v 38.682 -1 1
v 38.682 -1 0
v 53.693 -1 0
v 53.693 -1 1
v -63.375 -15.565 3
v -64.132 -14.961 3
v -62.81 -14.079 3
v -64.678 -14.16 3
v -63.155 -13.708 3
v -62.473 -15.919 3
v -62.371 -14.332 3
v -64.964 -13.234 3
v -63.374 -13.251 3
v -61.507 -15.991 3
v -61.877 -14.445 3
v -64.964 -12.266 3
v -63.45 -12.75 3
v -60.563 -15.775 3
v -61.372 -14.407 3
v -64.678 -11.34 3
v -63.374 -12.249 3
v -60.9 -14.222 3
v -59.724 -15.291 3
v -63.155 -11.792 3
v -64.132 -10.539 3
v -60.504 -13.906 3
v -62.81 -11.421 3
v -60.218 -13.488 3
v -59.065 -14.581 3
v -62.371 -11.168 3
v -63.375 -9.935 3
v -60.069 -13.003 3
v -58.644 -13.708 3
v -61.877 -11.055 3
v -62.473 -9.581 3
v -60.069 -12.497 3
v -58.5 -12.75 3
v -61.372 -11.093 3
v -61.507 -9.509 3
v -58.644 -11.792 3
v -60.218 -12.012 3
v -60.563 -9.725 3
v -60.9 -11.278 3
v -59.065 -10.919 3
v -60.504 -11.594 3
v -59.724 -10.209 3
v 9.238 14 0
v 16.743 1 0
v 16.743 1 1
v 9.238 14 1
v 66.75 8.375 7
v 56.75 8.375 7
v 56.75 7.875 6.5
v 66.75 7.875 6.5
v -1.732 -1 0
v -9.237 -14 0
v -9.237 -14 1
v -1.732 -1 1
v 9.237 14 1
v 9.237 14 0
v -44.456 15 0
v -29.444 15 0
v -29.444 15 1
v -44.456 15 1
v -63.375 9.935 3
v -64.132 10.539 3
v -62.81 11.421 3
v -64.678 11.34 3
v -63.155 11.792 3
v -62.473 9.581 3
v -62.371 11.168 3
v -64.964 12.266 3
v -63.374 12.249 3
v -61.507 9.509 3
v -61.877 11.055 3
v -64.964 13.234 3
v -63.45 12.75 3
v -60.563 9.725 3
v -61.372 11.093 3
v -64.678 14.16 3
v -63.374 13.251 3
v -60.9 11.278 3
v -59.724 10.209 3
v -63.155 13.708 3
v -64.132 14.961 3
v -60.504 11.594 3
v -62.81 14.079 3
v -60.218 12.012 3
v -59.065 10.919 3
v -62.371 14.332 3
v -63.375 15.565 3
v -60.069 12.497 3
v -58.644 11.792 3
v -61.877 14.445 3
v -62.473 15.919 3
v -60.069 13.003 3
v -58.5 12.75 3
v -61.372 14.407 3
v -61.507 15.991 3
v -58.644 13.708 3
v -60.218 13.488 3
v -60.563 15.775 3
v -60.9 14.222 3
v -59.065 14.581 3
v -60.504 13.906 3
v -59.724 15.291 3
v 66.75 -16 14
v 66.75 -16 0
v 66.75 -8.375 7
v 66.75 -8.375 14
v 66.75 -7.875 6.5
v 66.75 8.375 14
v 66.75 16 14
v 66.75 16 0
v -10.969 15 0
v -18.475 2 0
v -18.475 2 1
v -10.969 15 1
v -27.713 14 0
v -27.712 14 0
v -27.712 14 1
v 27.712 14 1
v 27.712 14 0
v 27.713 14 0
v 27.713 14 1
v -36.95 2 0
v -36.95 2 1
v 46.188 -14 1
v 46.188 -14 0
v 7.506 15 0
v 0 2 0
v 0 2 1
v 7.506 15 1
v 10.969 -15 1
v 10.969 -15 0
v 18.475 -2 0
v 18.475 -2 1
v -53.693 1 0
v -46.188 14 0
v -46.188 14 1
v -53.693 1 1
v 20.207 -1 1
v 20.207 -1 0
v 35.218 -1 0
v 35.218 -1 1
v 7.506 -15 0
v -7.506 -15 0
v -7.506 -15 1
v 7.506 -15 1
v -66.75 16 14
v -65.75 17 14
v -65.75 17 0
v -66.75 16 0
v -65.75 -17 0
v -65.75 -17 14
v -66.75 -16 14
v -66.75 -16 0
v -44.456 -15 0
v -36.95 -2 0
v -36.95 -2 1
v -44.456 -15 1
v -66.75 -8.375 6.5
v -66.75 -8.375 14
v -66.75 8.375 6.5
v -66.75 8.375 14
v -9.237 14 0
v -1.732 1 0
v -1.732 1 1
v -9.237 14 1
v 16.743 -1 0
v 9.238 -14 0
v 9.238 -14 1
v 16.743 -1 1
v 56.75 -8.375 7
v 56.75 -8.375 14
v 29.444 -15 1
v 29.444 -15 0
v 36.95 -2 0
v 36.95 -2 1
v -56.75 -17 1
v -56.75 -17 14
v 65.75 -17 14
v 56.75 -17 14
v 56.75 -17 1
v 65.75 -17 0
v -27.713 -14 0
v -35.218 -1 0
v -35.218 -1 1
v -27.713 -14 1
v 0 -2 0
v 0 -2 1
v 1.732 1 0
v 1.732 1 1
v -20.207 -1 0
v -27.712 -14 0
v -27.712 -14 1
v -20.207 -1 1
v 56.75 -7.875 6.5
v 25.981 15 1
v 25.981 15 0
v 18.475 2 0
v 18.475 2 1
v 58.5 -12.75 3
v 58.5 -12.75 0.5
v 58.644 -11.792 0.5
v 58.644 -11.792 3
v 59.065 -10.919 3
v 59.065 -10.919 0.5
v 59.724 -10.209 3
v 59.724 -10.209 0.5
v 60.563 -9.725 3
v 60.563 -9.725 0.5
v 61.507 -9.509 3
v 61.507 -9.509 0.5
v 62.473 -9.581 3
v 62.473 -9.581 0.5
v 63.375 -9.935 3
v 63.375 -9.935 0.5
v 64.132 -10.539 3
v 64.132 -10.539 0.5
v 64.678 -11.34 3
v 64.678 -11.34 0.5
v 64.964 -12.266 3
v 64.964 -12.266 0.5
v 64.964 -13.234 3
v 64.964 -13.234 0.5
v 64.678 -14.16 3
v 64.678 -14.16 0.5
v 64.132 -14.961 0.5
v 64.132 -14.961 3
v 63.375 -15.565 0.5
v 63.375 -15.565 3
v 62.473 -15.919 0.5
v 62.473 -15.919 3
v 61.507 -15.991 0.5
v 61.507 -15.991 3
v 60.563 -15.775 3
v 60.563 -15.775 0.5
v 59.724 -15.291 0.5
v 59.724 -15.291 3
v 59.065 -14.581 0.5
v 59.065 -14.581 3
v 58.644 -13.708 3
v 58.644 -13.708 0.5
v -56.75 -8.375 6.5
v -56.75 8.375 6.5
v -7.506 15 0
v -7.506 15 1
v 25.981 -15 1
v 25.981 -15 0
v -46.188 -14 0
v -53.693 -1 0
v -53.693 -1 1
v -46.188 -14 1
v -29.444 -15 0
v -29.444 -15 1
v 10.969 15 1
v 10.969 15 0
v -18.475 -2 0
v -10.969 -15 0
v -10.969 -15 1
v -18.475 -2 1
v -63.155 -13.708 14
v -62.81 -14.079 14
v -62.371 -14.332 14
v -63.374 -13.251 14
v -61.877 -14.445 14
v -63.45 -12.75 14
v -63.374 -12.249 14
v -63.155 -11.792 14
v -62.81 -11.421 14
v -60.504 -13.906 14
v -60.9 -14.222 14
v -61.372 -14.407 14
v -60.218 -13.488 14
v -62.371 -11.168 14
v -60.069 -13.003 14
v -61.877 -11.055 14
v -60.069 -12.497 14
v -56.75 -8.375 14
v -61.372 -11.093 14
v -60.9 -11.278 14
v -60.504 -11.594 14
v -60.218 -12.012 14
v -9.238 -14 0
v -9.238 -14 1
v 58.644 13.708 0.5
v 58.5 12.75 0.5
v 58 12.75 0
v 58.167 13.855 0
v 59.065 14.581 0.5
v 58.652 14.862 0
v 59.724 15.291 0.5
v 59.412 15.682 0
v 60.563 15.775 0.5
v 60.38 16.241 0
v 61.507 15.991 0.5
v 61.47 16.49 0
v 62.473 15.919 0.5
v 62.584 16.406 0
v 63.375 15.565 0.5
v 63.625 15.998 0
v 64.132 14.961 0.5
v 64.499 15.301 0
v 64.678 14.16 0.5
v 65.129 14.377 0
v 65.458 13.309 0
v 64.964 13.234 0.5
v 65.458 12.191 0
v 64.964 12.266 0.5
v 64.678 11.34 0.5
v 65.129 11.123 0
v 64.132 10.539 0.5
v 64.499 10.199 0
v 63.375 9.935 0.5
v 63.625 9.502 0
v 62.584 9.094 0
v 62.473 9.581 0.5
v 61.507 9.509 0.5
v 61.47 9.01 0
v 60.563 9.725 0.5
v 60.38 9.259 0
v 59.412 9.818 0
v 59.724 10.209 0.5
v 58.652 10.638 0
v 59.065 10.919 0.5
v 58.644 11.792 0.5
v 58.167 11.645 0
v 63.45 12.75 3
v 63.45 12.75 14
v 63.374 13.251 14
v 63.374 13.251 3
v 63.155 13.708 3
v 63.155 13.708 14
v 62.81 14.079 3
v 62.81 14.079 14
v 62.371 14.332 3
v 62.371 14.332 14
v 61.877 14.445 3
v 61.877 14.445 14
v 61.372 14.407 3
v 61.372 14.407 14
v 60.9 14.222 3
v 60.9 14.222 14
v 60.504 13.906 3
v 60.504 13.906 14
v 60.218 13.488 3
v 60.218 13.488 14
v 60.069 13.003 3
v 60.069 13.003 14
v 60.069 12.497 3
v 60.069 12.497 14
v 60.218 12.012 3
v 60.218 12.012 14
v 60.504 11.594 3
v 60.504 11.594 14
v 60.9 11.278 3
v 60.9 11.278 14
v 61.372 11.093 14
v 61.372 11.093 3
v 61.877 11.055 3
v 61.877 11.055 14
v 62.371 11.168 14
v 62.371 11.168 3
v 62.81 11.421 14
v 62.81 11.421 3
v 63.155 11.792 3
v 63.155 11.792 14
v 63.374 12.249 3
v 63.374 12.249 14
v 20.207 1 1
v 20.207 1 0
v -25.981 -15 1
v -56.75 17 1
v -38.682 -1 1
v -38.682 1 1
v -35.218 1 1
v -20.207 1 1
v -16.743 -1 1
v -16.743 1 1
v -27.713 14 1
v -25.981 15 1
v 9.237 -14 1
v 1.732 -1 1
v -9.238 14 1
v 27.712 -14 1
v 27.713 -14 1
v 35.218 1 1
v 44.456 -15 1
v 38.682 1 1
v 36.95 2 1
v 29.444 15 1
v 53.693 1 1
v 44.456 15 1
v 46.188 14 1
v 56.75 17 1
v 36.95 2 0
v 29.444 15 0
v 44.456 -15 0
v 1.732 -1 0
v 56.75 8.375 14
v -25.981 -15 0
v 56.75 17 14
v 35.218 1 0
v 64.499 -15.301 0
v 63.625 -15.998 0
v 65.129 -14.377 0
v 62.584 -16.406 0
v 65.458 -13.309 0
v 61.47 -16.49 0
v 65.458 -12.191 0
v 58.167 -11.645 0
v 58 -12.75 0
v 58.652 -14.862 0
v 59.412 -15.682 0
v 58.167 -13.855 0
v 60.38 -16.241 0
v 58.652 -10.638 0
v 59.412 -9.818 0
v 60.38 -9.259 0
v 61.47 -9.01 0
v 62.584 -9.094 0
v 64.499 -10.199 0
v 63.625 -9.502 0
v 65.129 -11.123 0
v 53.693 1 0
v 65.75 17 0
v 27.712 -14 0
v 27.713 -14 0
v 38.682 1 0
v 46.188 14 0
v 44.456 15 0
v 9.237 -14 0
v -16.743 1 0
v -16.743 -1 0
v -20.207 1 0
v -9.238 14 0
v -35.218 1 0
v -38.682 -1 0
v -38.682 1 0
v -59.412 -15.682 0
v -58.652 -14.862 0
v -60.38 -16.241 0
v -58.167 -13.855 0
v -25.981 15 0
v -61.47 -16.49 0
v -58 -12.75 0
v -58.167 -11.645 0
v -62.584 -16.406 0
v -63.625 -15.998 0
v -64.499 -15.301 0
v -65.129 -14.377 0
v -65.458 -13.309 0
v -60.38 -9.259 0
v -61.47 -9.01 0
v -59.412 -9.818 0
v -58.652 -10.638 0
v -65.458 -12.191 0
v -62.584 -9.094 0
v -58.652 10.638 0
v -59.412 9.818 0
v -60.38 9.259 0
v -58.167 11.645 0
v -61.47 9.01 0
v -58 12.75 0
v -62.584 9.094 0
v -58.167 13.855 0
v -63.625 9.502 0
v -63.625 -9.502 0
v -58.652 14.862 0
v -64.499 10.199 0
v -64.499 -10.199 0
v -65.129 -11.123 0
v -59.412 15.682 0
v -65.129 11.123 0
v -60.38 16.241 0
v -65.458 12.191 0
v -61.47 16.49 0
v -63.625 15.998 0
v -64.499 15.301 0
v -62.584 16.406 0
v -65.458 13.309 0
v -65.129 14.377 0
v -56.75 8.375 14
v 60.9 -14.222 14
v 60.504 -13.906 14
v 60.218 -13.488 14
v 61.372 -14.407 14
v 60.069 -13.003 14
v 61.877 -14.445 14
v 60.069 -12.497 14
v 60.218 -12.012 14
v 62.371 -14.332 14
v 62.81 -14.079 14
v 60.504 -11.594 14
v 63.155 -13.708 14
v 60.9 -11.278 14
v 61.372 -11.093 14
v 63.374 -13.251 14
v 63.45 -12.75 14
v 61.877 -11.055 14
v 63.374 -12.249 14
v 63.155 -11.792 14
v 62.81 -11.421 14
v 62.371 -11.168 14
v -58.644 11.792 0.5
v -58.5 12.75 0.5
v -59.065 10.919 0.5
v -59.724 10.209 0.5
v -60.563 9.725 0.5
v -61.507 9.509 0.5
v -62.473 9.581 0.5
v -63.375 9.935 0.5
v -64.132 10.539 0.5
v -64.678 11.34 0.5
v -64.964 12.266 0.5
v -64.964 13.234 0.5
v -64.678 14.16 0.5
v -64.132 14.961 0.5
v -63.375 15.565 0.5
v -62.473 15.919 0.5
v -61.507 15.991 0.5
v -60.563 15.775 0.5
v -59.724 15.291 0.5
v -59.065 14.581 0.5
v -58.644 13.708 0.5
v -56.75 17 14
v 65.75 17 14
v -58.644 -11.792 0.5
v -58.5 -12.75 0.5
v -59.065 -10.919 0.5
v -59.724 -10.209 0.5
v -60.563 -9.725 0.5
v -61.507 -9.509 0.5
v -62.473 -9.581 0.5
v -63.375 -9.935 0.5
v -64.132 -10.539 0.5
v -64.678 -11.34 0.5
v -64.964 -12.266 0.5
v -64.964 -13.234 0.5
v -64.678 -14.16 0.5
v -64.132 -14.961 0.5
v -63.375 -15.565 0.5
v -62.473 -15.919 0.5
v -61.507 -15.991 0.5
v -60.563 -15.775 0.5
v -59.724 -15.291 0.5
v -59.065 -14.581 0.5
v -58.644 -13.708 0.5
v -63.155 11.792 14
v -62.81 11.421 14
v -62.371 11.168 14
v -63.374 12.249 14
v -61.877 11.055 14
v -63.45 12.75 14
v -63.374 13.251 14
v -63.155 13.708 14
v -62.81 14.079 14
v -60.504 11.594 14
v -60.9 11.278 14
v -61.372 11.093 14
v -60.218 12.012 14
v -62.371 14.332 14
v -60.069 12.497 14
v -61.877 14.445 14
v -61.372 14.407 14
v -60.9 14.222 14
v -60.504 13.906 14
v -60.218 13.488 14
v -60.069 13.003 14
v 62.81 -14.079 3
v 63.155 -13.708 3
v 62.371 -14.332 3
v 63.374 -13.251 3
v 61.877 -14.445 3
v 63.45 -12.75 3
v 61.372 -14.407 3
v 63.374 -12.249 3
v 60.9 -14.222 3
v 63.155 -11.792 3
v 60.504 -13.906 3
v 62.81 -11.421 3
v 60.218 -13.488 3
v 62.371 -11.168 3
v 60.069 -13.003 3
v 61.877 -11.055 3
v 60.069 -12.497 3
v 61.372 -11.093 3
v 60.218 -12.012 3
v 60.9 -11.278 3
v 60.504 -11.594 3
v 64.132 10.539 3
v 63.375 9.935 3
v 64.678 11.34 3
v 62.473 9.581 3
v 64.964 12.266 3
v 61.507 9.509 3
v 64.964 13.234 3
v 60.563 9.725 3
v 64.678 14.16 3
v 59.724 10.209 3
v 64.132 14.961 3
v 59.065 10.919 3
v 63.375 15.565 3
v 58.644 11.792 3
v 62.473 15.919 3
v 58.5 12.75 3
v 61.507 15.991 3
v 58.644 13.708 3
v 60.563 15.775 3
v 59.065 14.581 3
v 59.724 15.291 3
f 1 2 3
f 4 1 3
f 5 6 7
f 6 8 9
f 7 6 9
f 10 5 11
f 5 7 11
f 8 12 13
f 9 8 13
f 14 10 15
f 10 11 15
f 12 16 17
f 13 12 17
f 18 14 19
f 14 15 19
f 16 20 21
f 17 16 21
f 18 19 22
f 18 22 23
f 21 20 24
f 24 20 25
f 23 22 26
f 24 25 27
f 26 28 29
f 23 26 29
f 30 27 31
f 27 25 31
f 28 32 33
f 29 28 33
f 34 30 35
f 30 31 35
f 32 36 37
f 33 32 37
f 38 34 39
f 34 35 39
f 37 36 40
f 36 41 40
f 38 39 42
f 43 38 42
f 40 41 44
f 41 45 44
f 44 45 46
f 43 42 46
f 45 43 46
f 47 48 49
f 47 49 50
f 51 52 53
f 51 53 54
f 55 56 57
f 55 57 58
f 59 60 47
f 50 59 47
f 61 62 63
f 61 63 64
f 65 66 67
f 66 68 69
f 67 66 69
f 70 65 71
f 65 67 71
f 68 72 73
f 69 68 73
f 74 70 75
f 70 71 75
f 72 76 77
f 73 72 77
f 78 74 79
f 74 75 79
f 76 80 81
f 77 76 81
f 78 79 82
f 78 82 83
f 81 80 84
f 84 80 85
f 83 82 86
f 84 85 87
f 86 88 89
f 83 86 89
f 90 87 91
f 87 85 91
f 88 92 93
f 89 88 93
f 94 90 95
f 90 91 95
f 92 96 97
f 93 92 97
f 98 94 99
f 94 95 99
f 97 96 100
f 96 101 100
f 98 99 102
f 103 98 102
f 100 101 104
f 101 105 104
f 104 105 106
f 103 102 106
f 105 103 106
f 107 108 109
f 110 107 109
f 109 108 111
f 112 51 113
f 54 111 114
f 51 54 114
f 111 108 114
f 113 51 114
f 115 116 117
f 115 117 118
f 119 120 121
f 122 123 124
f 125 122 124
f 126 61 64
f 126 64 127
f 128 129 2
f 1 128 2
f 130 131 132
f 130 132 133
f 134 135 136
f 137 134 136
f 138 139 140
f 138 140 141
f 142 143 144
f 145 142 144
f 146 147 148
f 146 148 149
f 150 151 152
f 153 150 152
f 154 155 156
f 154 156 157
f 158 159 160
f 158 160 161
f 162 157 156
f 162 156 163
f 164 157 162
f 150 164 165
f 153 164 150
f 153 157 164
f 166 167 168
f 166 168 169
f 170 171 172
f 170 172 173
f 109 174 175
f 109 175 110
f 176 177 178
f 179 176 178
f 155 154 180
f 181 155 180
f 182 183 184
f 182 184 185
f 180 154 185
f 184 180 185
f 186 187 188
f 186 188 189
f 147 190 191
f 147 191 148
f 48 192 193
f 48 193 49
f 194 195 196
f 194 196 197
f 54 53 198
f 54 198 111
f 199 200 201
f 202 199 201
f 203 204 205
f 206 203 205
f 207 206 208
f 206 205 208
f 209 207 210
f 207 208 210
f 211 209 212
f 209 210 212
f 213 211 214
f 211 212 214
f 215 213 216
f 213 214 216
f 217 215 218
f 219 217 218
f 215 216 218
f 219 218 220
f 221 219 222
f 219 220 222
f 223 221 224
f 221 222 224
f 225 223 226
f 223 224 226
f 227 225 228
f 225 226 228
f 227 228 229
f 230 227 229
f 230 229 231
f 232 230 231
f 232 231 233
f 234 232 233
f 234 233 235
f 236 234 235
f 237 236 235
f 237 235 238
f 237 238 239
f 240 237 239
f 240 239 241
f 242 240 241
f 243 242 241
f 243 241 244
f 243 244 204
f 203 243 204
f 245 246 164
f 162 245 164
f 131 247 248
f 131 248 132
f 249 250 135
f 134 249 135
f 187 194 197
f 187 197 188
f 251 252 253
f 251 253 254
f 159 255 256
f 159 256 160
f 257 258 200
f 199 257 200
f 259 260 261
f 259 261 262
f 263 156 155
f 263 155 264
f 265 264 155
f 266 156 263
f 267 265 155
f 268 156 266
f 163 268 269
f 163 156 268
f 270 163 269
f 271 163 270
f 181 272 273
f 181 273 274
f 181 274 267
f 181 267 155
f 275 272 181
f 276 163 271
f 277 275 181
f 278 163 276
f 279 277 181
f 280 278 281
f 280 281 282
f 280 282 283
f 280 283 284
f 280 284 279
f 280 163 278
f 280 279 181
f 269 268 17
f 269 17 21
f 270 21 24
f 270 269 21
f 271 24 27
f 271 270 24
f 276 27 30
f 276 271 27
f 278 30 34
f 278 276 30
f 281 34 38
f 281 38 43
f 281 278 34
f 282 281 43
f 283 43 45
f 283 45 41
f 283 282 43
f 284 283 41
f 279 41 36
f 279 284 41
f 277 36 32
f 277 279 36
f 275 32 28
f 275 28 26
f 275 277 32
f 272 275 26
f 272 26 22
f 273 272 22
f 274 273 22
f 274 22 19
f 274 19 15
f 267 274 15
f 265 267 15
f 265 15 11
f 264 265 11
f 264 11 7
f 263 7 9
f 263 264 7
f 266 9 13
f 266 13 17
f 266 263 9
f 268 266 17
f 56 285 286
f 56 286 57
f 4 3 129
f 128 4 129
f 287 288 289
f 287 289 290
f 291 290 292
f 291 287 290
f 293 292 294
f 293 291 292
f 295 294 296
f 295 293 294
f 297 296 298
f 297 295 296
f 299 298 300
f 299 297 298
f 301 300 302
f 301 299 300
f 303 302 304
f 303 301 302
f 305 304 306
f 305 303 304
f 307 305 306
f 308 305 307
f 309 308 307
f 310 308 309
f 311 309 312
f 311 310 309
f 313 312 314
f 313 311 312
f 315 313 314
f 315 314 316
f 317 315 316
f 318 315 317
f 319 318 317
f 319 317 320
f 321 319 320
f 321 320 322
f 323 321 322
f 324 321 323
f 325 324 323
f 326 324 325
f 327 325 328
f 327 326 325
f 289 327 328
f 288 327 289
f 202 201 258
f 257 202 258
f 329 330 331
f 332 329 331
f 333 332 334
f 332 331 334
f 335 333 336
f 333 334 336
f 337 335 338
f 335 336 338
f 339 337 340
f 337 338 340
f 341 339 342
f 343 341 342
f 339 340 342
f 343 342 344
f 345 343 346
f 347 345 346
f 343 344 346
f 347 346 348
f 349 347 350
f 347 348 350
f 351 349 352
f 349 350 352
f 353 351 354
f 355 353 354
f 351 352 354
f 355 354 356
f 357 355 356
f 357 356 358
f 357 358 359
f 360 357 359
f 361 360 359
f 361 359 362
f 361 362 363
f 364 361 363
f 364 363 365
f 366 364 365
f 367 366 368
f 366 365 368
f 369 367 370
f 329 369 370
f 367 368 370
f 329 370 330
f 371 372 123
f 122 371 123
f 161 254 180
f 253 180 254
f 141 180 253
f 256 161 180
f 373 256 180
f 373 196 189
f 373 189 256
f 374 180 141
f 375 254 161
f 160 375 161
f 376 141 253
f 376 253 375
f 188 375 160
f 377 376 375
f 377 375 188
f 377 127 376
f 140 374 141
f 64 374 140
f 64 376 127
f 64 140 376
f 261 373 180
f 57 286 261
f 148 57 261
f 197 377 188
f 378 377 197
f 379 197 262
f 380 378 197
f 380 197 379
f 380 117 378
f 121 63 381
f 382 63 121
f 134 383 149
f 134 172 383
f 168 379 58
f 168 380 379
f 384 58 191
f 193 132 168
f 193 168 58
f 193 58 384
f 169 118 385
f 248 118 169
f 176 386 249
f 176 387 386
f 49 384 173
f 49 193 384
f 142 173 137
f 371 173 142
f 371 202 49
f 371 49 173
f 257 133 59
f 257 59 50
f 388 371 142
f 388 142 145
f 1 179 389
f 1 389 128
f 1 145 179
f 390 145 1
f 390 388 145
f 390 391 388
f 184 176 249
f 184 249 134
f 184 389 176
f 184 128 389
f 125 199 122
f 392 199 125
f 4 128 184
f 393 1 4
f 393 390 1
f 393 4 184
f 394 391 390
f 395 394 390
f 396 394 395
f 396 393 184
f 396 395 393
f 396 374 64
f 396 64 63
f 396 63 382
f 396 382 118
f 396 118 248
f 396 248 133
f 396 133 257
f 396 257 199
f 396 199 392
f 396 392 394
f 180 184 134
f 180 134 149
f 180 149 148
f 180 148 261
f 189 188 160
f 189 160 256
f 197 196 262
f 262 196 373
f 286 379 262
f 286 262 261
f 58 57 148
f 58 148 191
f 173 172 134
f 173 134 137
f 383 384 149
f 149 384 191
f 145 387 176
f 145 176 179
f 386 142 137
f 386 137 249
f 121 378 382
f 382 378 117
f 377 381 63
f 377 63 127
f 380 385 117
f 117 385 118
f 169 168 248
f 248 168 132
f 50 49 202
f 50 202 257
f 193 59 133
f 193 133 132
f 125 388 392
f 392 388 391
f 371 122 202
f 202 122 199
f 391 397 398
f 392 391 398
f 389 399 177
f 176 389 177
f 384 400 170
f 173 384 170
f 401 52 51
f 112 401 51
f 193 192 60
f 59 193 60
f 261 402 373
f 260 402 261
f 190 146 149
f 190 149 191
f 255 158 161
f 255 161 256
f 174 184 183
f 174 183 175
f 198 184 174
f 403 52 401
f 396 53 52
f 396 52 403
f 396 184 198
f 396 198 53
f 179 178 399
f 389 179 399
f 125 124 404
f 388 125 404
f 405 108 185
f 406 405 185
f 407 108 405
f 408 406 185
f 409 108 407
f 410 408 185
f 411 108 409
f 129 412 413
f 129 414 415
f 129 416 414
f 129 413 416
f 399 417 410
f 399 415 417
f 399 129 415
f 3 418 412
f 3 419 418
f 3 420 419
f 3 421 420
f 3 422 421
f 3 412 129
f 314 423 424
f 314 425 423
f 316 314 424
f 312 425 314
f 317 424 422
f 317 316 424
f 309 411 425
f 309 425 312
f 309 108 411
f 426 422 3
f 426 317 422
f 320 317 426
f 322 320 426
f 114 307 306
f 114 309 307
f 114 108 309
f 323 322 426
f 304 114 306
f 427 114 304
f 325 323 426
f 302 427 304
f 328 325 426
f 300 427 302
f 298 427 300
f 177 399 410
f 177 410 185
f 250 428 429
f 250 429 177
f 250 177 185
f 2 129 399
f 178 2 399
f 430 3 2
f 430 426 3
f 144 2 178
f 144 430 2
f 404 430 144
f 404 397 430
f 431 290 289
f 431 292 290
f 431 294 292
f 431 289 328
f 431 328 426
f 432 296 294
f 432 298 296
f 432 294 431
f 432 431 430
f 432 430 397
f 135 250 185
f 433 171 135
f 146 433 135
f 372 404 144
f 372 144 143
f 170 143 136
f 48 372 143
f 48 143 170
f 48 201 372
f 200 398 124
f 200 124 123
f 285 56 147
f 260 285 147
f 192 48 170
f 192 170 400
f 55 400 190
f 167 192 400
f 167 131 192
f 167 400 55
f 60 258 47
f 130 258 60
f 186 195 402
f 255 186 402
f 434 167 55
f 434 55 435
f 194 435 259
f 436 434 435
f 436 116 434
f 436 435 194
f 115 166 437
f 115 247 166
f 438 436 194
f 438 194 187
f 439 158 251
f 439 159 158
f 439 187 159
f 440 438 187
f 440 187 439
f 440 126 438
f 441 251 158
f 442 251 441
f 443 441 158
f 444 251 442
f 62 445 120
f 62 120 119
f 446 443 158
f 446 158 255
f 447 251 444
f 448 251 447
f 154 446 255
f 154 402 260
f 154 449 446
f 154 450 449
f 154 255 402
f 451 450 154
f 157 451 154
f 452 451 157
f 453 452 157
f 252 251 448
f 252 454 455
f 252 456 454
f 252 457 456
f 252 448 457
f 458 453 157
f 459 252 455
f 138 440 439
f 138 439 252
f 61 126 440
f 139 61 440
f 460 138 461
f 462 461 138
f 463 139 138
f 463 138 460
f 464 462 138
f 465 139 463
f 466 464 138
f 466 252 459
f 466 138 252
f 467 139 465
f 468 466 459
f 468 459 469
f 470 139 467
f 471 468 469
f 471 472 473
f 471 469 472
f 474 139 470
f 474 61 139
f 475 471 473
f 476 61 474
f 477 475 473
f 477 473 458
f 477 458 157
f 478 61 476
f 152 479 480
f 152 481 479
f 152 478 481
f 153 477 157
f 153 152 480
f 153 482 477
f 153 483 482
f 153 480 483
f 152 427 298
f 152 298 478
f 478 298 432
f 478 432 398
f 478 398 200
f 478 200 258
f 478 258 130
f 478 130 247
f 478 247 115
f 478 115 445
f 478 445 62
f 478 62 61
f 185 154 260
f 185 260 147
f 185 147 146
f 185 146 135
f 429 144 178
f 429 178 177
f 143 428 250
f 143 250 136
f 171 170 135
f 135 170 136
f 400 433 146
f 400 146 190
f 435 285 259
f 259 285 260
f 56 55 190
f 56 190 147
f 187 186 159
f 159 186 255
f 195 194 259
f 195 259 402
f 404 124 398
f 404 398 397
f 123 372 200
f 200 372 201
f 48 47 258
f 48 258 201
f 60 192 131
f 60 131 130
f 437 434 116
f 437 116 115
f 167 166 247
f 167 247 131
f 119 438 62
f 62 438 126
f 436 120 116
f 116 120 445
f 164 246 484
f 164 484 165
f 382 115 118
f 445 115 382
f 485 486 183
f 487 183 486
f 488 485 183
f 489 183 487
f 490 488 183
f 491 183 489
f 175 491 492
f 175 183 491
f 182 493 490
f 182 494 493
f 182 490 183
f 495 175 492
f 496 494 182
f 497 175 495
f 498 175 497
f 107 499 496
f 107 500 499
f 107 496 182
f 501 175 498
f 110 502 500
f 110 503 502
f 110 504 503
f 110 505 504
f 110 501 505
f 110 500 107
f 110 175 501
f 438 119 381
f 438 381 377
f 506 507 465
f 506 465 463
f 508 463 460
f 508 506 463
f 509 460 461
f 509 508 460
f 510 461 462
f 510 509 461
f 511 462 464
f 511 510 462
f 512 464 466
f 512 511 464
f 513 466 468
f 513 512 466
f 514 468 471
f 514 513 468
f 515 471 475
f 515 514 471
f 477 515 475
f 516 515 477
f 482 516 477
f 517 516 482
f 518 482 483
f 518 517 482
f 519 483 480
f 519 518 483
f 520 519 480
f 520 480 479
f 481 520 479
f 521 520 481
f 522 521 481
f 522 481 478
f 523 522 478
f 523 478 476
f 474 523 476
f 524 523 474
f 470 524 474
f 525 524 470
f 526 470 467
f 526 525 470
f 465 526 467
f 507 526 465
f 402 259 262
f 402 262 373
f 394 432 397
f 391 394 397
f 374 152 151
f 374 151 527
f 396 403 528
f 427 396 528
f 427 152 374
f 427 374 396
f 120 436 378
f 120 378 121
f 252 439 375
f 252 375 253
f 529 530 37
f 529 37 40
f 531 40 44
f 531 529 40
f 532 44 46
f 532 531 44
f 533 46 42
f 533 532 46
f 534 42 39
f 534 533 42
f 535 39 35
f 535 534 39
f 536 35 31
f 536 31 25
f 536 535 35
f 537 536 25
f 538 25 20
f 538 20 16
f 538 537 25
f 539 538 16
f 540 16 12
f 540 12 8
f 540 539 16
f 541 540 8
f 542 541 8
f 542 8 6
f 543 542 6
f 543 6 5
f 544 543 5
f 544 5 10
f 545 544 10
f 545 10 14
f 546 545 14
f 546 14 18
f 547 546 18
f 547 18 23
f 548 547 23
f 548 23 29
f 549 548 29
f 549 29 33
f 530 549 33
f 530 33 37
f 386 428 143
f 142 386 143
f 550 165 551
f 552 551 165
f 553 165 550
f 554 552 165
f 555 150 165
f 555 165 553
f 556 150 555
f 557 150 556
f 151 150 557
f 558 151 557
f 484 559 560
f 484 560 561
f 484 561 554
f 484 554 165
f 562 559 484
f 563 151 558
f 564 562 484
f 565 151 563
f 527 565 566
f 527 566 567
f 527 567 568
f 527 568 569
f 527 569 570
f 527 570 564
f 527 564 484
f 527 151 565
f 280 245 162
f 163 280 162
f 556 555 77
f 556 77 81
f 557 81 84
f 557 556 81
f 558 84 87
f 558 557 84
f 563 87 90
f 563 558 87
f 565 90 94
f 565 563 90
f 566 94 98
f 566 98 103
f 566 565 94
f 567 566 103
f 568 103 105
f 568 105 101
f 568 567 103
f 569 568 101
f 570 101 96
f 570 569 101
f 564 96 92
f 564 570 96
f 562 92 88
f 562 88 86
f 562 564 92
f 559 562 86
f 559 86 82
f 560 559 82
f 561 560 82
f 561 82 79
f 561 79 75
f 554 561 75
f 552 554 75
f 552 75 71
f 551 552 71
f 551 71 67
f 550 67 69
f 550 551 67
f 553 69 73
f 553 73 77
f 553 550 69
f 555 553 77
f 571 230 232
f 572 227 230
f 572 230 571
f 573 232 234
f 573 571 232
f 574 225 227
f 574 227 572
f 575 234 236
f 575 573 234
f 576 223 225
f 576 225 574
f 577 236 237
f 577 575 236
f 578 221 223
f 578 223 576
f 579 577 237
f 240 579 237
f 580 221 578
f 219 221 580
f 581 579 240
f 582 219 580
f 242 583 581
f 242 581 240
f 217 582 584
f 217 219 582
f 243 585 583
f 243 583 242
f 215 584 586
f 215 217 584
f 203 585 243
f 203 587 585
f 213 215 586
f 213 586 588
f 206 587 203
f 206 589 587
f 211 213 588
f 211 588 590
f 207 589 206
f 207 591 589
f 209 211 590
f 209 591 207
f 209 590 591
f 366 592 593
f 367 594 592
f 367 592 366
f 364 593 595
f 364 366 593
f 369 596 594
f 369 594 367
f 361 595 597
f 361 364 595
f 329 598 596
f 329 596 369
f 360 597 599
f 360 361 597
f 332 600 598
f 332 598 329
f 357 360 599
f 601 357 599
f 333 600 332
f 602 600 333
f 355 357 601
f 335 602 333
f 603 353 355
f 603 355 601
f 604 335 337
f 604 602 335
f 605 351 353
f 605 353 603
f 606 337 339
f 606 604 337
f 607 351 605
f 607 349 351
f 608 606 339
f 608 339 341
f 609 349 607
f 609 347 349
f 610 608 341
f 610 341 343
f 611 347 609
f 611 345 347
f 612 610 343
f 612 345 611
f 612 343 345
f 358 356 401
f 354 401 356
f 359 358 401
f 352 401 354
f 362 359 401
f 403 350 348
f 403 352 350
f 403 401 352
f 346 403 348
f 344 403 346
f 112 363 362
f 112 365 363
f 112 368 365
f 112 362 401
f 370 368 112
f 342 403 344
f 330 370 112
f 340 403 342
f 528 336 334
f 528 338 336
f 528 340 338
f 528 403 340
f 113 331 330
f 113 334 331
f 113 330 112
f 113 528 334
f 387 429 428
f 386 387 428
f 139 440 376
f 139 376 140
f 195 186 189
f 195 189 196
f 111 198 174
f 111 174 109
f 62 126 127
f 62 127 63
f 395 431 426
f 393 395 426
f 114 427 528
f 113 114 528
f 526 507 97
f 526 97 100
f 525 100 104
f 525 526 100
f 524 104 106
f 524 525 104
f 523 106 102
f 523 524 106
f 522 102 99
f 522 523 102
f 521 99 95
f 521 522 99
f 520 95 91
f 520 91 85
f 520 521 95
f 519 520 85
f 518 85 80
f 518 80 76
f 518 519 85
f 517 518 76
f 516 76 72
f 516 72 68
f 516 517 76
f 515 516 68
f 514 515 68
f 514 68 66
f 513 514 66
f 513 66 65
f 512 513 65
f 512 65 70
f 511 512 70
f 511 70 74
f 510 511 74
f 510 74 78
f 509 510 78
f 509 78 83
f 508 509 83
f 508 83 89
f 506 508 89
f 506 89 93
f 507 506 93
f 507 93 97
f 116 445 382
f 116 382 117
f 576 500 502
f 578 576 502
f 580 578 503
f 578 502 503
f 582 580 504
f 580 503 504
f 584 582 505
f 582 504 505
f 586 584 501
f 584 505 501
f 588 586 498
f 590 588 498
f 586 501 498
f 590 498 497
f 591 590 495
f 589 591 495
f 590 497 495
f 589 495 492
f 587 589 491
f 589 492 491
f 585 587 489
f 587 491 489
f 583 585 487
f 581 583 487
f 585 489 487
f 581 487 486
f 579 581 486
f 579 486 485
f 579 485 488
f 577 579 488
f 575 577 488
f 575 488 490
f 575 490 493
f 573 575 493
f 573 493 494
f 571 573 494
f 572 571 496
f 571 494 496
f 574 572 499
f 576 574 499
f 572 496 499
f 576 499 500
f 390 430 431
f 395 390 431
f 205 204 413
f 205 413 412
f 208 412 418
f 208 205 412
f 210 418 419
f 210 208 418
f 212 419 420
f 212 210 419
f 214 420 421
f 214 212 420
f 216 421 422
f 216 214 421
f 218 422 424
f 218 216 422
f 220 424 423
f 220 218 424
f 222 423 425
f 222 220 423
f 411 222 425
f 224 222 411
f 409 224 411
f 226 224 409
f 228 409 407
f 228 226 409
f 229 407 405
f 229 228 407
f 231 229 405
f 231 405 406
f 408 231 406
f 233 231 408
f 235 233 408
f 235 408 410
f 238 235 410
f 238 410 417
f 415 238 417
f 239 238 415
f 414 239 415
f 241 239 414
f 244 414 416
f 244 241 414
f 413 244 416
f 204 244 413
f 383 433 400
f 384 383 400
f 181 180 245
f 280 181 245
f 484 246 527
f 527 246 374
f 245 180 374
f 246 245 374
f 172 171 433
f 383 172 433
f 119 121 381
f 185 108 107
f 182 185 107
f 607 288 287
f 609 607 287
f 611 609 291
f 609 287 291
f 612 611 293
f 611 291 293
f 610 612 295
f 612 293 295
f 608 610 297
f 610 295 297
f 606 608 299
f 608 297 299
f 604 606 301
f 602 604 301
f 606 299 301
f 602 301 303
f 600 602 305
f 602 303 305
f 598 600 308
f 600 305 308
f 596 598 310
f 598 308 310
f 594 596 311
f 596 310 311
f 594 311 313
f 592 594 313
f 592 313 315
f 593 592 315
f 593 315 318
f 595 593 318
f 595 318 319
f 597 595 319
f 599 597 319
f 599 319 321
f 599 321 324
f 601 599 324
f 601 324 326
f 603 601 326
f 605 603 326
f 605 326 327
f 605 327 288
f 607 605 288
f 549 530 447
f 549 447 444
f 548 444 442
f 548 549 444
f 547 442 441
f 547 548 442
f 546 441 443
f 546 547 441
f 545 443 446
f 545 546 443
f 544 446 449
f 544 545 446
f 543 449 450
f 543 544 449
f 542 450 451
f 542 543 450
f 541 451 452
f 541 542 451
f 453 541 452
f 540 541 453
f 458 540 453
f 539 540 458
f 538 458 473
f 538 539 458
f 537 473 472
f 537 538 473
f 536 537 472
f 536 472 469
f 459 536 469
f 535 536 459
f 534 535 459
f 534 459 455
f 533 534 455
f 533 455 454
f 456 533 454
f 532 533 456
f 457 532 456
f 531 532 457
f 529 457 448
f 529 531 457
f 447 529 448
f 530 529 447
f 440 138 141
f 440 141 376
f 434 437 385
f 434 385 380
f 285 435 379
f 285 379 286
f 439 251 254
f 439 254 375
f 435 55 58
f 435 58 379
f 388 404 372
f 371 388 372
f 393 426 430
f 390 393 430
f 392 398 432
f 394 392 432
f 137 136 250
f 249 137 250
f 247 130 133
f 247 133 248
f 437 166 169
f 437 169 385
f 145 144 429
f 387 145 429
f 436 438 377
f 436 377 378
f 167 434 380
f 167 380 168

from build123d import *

# Parameters (mm, degrees)
SKETCH1_W                      = 133.5
SKETCH1_H                      = 34
BOSS_EXTRUDE1_DEPTH            = 1
SKETCH2_W                      = 10
SKETCH2_H                      = 8.625
BOSS_EXTRUDE2_DEPTH            = 15
SKETCH2_3_W                    = 10
SKETCH2_3_H                    = 16.75
BOSS_EXTRUDE3_DEPTH            = 6.5
CBORE_FOR_M3_SHCS1_D           = 3.4
CBORE_FOR_M3_SHCS1_CBORE_D     = 6.5
CBORE_FOR_M3_SHCS1_CBORE_DEPTH = 3
CHAMFER1_SIZE                  = 0.5
CHAMFER2_SIZE                  = 0.5
CUT_EXTRUDE1_DEPTH             = 71.495123945
LPATTERN1_COUNT                = 3
LPATTERN1_PITCH                = 18.475
MIRROR2_COPY_1_DEPTH           = 71.495123945
MIRROR2_COPY_2_DEPTH           = 71.495123945
MIRROR2_COPY_3_DEPTH           = 71.495123945
CHAMFER3_SIZE                  = 1
INTERSECT1_START               = 14
INTERSECT1_OUTLINE_R           = 1.7
INTERSECT1_DEPTH               = 1


# Read off the part's stored shape, not the designer's step: Intersect1
with BuildPart() as part:
    # Sketch1 → Boss-Extrude1 (new body)
    with BuildSketch(Plane.XY):
        Rectangle(SKETCH1_W, SKETCH1_H)
    extrude(amount=BOSS_EXTRUDE1_DEPTH)

    # Sketch2 → Boss-Extrude2 (add)
    with BuildSketch(Plane.XY):
        with Locations((61.75, -12.6875)):
            Rectangle(SKETCH2_W, SKETCH2_H)
        with Locations((61.75, 12.6875)):
            Rectangle(SKETCH2_W, SKETCH2_H)
    boss_extrude2 = extrude(amount=BOSS_EXTRUDE2_DEPTH)

    # Sketch2<3> → Boss-Extrude3 (add)
    with BuildSketch(Plane.XY):
        with Locations((61.75, 0)):
            Rectangle(SKETCH2_3_W, SKETCH2_3_H)
    boss_extrude3 = extrude(amount=BOSS_EXTRUDE3_DEPTH)

    # CBORE for M3 SHCS1 (through all)
    with Locations(Plane(origin=(0, 0, 0), x_dir=(-1, 0, 0), z_dir=(0, 0, -1))):
        with Locations((-61.75, 12.75), (-61.75, -12.75)):
            cbore_for_m3_shcs1 = CounterBoreHole(CBORE_FOR_M3_SHCS1_D / 2, CBORE_FOR_M3_SHCS1_CBORE_D / 2, CBORE_FOR_M3_SHCS1_CBORE_DEPTH)

    # Chamfer1
    chamfer1_edges = [part.edges().sort_by_distance(p)[0] for p in [
        (61.75, 8.375, 6.5),
        (61.75, -8.375, 6.5),
    ]]
    chamfer(chamfer1_edges, length=CHAMFER1_SIZE)

    # Mirror1: Boss-Extrude2, Boss-Extrude3, CBORE for M3 SHCS1 across plane
    add(boss_extrude2.mirror(Plane(origin=(0, 0, 0), x_dir=(0, 0, 1), z_dir=(1, 0, 0))))
    add(boss_extrude3.mirror(Plane(origin=(0, 0, 0), x_dir=(0, 0, 1), z_dir=(1, 0, 0))))
    add(cbore_for_m3_shcs1.mirror(Plane(origin=(0, 0, 0), x_dir=(0, 0, 1), z_dir=(1, 0, 0))), mode=Mode.SUBTRACT)

    # Chamfer2
    chamfer2_edges = [part.edges().sort_by_distance(p)[0] for p in [
        (-65, -12.75, 0),
        (-65, 12.75, 0),
        (65, -12.75, 0),
        (65, 12.75, 0),
    ]]
    chamfer(chamfer2_edges, length=CHAMFER2_SIZE)

    # Sketch6 → Cut-Extrude1 (cut, through all)
    with BuildSketch(Plane.XY):
        Polygon((-7.505553499, 15), (0, 2), (7.505553499, 15), align=None)
        Polygon((-16.743157806, 1), (-1.732050808, 1), (-9.237604307, 14), align=None)
        Polygon((-16.743157806, -1), (-9.237604307, -14), (-1.732050808, -1), align=None)
        Polygon((1.732050808, 1), (16.743157806, 1), (9.237604307, 14), align=None)
        Polygon((1.732050808, -1), (9.237604307, -14), (16.743157806, -1), align=None)
        Polygon((-7.505553499, -15), (7.505553499, -15), (0, -2), align=None)
    cut_extrude1 = extrude(amount=CUT_EXTRUDE1_DEPTH, mode=Mode.SUBTRACT)

    # LPattern1: Cut-Extrude1 ×3
    with Locations(*[(-i * LPATTERN1_PITCH, 0, 0) for i in range(1, LPATTERN1_COUNT)]):
        add(cut_extrude1, mode=Mode.SUBTRACT)

    # Mirror2 copy 1 sketch → Mirror2 copy 1 (cut, through all)
    with BuildSketch(Plane(origin=(18.475, 0, 0), x_dir=(-1, 0, 0), z_dir=(0, 0, 1))):
        Polygon((-7.505553499, -15), (0, -2), (7.505553499, -15), align=None)
        Polygon((-16.743157806, -1), (-1.732050808, -1), (-9.237604307, -14), align=None)
        Polygon((-16.743157806, 1), (-9.237604307, 14), (-1.732050808, 1), align=None)
        Polygon((1.732050808, -1), (16.743157806, -1), (9.237604307, -14), align=None)
        Polygon((1.732050808, 1), (9.237604307, 14), (16.743157806, 1), align=None)
        Polygon((-7.505553499, 15), (7.505553499, 15), (0, 2), align=None)
    extrude(amount=MIRROR2_COPY_1_DEPTH, mode=Mode.SUBTRACT)

    # Mirror2 copy 2 sketch → Mirror2 copy 2 (cut, through all)
    with BuildSketch(Plane(origin=(36.95, 0, 0), x_dir=(-1, 0, 0), z_dir=(0, 0, 1))):
        Polygon((-7.505553499, -15), (0, -2), (7.505553499, -15), align=None)
        Polygon((-16.743157806, -1), (-1.732050808, -1), (-9.237604307, -14), align=None)
        Polygon((-16.743157806, 1), (-9.237604307, 14), (-1.732050808, 1), align=None)
        Polygon((1.732050808, -1), (16.743157806, -1), (9.237604307, -14), align=None)
        Polygon((1.732050808, 1), (9.237604307, 14), (16.743157806, 1), align=None)
        Polygon((-7.505553499, 15), (7.505553499, 15), (0, 2), align=None)
    extrude(amount=MIRROR2_COPY_2_DEPTH, mode=Mode.SUBTRACT)

    # Mirror2 copy 3 sketch → Mirror2 copy 3 (cut, through all)
    with BuildSketch(Plane(origin=(0, 0, 0), x_dir=(-1, 0, 0), z_dir=(0, 0, 1))):
        Polygon((-7.505553499, -15), (0, -2), (7.505553499, -15), align=None)
        Polygon((-16.743157806, -1), (-1.732050808, -1), (-9.237604307, -14), align=None)
        Polygon((-16.743157806, 1), (-9.237604307, 14), (-1.732050808, 1), align=None)
        Polygon((1.732050808, -1), (16.743157806, -1), (9.237604307, -14), align=None)
        Polygon((1.732050808, 1), (9.237604307, 14), (16.743157806, 1), align=None)
        Polygon((-7.505553499, 15), (7.505553499, 15), (0, 2), align=None)
    extrude(amount=MIRROR2_COPY_3_DEPTH, mode=Mode.SUBTRACT)

    # Chamfer3
    chamfer3_edges = [part.edges().sort_by_distance(p)[0] for p in [
        (66.75, -17, 7.5),
        (-66.75, -17, 7.5),
        (-66.75, 17, 7.5),
        (66.75, 17, 7.5),
    ]]
    chamfer(chamfer3_edges, length=CHAMFER3_SIZE)

    # Intersect1 outline → Intersect1 (cut)
    # profile 1 of 4: a face of its own
    with BuildSketch(Plane.XY.offset(INTERSECT1_START)):
        Polygon((-56.75, 17), (-65.75, 17), (-66.75, 16), (-66.75, 8.375), (-56.75, 8.375), align=None)
        with Locations((-61.75, 12.75)):
            Circle(INTERSECT1_OUTLINE_R, mode=Mode.SUBTRACT)
    # profile 2 of 4: a face of its own
    with BuildSketch(Plane.XY.offset(INTERSECT1_START)):
        Polygon((65.75, 17), (56.75, 17), (56.75, 8.375), (66.75, 8.375), (66.75, 16), align=None)
        with Locations((61.75, 12.75)):
            Circle(INTERSECT1_OUTLINE_R, mode=Mode.SUBTRACT)
    # profile 3 of 4: a face of its own
    with BuildSketch(Plane.XY.offset(INTERSECT1_START)):
        Polygon((-56.75, -17), (-56.75, -8.375), (-66.75, -8.375), (-66.75, -16), (-65.75, -17), align=None)
        with Locations((-61.75, -12.75)):
            Circle(INTERSECT1_OUTLINE_R, mode=Mode.SUBTRACT)
    # profile 4 of 4: a face of its own
    with BuildSketch(Plane.XY.offset(INTERSECT1_START)):
        Polygon((66.75, -8.375), (56.75, -8.375), (56.75, -17), (65.75, -17), (66.75, -16), align=None)
        with Locations((61.75, -12.75)):
            Circle(INTERSECT1_OUTLINE_R, mode=Mode.SUBTRACT)
    extrude(amount=INTERSECT1_DEPTH, mode=Mode.SUBTRACT)


solid = part.part
